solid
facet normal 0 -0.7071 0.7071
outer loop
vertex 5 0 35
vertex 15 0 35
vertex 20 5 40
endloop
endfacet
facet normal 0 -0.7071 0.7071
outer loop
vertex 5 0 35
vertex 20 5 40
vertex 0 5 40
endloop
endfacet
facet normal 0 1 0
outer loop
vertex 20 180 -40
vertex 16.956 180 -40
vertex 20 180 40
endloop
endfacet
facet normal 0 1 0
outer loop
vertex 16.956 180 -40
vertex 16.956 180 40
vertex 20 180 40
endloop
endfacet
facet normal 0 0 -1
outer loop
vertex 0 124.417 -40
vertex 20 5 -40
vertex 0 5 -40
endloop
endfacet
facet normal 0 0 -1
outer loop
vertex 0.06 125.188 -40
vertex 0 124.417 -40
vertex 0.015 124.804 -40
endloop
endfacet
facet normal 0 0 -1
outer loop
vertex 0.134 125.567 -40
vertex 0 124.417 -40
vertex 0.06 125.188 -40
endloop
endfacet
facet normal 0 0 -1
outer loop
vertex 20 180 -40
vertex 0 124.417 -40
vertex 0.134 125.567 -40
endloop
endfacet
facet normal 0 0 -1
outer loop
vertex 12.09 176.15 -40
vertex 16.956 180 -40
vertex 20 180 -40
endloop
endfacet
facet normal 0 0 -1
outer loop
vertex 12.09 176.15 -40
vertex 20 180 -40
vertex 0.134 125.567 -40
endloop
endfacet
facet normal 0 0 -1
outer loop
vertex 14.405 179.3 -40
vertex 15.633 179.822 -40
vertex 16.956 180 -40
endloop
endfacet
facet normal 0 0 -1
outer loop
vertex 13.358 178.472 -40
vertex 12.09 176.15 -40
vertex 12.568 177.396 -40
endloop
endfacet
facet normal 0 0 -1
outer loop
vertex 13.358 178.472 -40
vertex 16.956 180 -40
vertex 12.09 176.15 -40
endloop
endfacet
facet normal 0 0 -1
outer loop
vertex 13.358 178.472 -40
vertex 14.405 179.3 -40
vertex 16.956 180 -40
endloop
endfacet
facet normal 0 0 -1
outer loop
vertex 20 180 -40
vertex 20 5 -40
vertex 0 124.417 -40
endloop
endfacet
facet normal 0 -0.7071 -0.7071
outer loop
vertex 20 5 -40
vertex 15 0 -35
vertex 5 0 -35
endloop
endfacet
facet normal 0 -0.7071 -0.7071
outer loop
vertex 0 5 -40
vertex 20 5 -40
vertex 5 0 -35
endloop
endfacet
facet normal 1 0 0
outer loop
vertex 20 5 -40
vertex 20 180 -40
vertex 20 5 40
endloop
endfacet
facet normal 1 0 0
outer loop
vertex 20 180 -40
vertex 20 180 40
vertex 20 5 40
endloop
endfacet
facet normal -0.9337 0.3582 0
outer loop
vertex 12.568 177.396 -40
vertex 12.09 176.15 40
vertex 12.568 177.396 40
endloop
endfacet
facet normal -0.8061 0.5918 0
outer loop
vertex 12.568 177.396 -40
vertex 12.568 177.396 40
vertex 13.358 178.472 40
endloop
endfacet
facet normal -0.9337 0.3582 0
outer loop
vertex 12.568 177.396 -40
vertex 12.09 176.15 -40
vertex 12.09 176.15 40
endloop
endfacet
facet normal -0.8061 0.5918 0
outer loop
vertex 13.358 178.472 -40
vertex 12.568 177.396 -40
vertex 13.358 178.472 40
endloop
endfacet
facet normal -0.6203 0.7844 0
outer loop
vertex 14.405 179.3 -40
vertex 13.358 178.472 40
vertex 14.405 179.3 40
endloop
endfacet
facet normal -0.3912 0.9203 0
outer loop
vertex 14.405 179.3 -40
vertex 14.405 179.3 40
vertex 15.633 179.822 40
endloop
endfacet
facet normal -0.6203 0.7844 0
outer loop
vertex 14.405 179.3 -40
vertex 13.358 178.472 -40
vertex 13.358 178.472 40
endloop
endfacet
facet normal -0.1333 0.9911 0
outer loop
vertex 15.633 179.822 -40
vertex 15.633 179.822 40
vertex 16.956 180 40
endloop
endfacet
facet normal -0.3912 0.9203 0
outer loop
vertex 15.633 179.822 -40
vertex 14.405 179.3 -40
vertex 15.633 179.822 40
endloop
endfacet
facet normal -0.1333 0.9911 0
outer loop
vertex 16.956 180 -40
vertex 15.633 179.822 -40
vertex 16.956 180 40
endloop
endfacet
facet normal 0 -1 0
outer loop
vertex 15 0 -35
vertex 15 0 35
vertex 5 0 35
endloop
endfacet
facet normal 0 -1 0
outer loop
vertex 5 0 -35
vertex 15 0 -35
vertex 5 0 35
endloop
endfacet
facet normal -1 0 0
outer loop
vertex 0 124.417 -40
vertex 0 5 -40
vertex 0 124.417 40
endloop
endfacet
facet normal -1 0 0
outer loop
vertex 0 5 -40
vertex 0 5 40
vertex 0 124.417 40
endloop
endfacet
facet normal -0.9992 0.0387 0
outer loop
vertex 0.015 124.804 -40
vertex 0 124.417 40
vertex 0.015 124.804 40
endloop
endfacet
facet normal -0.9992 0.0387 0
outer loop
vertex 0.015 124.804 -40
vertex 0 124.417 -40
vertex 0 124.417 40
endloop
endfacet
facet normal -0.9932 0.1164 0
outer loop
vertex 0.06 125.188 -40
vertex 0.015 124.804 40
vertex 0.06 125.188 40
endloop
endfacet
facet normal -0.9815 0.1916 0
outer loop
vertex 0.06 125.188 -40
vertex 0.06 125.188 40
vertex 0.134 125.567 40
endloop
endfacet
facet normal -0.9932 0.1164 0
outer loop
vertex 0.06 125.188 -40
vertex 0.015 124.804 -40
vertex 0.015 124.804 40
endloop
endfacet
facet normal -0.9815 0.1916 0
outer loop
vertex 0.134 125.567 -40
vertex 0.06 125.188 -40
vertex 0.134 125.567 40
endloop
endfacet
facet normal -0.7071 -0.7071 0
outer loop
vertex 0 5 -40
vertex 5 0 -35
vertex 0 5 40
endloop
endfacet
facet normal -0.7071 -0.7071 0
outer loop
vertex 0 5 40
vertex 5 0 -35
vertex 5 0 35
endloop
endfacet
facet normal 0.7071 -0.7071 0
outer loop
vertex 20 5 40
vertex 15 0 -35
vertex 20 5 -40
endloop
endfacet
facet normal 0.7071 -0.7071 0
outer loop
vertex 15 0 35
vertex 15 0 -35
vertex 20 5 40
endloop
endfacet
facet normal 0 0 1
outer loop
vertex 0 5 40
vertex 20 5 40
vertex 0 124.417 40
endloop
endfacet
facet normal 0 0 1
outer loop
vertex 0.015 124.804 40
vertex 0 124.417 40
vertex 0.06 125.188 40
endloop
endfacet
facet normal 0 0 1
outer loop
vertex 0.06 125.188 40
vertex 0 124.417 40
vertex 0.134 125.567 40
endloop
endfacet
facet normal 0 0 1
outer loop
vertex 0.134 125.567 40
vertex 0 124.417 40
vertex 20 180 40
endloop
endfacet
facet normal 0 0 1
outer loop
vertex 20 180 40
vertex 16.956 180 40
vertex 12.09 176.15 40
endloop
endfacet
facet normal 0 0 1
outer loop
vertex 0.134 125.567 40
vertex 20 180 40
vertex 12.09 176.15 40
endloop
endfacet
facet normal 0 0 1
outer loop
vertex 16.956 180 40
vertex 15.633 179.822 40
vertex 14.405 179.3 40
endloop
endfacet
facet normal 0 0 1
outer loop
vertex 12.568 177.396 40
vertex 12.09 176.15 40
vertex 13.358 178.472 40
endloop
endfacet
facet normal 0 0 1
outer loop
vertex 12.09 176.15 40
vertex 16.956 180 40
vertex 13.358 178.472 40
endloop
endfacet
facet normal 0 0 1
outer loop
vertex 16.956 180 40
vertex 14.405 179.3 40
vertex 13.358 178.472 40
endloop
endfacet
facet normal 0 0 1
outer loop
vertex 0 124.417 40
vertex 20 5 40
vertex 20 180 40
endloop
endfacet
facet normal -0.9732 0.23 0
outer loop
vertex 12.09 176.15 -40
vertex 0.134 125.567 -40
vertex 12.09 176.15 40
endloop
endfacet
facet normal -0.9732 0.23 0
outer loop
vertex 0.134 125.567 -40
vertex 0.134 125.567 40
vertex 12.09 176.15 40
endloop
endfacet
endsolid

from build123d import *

# Parameters (mm, degrees)
EXTRUDE_1_DEPTH = 40
CHAMFER_1_SIZE  = 5
FILLET_1_R      = 5


with BuildPart() as part:
    # 草图1 → 凸台-拉伸1 (new, symmetric)
    with BuildSketch(Plane.XY):
        Polygon((0, 0), (0, 125), (13, 180), (20, 180), (20, 0), align=None)
    extrude(amount=EXTRUDE_1_DEPTH, both=True)

    # 倒角1
    chamfer_1_edges = [part.edges().sort_by_distance(p)[0] for p in [
        (10, 0, 40),
        (10, 0, -40),
        (0, 0, 0),
        (20, 0, 0),
    ]]
    chamfer(chamfer_1_edges, length=CHAMFER_1_SIZE)

    # 圆角1
    fillet_1_edges = [part.edges().sort_by_distance(p)[0] for p in [
        (0, 125, 0),
        (13, 180, 0),
    ]]
    fillet(fillet_1_edges, radius=FILLET_1_R)


solid = part.part
